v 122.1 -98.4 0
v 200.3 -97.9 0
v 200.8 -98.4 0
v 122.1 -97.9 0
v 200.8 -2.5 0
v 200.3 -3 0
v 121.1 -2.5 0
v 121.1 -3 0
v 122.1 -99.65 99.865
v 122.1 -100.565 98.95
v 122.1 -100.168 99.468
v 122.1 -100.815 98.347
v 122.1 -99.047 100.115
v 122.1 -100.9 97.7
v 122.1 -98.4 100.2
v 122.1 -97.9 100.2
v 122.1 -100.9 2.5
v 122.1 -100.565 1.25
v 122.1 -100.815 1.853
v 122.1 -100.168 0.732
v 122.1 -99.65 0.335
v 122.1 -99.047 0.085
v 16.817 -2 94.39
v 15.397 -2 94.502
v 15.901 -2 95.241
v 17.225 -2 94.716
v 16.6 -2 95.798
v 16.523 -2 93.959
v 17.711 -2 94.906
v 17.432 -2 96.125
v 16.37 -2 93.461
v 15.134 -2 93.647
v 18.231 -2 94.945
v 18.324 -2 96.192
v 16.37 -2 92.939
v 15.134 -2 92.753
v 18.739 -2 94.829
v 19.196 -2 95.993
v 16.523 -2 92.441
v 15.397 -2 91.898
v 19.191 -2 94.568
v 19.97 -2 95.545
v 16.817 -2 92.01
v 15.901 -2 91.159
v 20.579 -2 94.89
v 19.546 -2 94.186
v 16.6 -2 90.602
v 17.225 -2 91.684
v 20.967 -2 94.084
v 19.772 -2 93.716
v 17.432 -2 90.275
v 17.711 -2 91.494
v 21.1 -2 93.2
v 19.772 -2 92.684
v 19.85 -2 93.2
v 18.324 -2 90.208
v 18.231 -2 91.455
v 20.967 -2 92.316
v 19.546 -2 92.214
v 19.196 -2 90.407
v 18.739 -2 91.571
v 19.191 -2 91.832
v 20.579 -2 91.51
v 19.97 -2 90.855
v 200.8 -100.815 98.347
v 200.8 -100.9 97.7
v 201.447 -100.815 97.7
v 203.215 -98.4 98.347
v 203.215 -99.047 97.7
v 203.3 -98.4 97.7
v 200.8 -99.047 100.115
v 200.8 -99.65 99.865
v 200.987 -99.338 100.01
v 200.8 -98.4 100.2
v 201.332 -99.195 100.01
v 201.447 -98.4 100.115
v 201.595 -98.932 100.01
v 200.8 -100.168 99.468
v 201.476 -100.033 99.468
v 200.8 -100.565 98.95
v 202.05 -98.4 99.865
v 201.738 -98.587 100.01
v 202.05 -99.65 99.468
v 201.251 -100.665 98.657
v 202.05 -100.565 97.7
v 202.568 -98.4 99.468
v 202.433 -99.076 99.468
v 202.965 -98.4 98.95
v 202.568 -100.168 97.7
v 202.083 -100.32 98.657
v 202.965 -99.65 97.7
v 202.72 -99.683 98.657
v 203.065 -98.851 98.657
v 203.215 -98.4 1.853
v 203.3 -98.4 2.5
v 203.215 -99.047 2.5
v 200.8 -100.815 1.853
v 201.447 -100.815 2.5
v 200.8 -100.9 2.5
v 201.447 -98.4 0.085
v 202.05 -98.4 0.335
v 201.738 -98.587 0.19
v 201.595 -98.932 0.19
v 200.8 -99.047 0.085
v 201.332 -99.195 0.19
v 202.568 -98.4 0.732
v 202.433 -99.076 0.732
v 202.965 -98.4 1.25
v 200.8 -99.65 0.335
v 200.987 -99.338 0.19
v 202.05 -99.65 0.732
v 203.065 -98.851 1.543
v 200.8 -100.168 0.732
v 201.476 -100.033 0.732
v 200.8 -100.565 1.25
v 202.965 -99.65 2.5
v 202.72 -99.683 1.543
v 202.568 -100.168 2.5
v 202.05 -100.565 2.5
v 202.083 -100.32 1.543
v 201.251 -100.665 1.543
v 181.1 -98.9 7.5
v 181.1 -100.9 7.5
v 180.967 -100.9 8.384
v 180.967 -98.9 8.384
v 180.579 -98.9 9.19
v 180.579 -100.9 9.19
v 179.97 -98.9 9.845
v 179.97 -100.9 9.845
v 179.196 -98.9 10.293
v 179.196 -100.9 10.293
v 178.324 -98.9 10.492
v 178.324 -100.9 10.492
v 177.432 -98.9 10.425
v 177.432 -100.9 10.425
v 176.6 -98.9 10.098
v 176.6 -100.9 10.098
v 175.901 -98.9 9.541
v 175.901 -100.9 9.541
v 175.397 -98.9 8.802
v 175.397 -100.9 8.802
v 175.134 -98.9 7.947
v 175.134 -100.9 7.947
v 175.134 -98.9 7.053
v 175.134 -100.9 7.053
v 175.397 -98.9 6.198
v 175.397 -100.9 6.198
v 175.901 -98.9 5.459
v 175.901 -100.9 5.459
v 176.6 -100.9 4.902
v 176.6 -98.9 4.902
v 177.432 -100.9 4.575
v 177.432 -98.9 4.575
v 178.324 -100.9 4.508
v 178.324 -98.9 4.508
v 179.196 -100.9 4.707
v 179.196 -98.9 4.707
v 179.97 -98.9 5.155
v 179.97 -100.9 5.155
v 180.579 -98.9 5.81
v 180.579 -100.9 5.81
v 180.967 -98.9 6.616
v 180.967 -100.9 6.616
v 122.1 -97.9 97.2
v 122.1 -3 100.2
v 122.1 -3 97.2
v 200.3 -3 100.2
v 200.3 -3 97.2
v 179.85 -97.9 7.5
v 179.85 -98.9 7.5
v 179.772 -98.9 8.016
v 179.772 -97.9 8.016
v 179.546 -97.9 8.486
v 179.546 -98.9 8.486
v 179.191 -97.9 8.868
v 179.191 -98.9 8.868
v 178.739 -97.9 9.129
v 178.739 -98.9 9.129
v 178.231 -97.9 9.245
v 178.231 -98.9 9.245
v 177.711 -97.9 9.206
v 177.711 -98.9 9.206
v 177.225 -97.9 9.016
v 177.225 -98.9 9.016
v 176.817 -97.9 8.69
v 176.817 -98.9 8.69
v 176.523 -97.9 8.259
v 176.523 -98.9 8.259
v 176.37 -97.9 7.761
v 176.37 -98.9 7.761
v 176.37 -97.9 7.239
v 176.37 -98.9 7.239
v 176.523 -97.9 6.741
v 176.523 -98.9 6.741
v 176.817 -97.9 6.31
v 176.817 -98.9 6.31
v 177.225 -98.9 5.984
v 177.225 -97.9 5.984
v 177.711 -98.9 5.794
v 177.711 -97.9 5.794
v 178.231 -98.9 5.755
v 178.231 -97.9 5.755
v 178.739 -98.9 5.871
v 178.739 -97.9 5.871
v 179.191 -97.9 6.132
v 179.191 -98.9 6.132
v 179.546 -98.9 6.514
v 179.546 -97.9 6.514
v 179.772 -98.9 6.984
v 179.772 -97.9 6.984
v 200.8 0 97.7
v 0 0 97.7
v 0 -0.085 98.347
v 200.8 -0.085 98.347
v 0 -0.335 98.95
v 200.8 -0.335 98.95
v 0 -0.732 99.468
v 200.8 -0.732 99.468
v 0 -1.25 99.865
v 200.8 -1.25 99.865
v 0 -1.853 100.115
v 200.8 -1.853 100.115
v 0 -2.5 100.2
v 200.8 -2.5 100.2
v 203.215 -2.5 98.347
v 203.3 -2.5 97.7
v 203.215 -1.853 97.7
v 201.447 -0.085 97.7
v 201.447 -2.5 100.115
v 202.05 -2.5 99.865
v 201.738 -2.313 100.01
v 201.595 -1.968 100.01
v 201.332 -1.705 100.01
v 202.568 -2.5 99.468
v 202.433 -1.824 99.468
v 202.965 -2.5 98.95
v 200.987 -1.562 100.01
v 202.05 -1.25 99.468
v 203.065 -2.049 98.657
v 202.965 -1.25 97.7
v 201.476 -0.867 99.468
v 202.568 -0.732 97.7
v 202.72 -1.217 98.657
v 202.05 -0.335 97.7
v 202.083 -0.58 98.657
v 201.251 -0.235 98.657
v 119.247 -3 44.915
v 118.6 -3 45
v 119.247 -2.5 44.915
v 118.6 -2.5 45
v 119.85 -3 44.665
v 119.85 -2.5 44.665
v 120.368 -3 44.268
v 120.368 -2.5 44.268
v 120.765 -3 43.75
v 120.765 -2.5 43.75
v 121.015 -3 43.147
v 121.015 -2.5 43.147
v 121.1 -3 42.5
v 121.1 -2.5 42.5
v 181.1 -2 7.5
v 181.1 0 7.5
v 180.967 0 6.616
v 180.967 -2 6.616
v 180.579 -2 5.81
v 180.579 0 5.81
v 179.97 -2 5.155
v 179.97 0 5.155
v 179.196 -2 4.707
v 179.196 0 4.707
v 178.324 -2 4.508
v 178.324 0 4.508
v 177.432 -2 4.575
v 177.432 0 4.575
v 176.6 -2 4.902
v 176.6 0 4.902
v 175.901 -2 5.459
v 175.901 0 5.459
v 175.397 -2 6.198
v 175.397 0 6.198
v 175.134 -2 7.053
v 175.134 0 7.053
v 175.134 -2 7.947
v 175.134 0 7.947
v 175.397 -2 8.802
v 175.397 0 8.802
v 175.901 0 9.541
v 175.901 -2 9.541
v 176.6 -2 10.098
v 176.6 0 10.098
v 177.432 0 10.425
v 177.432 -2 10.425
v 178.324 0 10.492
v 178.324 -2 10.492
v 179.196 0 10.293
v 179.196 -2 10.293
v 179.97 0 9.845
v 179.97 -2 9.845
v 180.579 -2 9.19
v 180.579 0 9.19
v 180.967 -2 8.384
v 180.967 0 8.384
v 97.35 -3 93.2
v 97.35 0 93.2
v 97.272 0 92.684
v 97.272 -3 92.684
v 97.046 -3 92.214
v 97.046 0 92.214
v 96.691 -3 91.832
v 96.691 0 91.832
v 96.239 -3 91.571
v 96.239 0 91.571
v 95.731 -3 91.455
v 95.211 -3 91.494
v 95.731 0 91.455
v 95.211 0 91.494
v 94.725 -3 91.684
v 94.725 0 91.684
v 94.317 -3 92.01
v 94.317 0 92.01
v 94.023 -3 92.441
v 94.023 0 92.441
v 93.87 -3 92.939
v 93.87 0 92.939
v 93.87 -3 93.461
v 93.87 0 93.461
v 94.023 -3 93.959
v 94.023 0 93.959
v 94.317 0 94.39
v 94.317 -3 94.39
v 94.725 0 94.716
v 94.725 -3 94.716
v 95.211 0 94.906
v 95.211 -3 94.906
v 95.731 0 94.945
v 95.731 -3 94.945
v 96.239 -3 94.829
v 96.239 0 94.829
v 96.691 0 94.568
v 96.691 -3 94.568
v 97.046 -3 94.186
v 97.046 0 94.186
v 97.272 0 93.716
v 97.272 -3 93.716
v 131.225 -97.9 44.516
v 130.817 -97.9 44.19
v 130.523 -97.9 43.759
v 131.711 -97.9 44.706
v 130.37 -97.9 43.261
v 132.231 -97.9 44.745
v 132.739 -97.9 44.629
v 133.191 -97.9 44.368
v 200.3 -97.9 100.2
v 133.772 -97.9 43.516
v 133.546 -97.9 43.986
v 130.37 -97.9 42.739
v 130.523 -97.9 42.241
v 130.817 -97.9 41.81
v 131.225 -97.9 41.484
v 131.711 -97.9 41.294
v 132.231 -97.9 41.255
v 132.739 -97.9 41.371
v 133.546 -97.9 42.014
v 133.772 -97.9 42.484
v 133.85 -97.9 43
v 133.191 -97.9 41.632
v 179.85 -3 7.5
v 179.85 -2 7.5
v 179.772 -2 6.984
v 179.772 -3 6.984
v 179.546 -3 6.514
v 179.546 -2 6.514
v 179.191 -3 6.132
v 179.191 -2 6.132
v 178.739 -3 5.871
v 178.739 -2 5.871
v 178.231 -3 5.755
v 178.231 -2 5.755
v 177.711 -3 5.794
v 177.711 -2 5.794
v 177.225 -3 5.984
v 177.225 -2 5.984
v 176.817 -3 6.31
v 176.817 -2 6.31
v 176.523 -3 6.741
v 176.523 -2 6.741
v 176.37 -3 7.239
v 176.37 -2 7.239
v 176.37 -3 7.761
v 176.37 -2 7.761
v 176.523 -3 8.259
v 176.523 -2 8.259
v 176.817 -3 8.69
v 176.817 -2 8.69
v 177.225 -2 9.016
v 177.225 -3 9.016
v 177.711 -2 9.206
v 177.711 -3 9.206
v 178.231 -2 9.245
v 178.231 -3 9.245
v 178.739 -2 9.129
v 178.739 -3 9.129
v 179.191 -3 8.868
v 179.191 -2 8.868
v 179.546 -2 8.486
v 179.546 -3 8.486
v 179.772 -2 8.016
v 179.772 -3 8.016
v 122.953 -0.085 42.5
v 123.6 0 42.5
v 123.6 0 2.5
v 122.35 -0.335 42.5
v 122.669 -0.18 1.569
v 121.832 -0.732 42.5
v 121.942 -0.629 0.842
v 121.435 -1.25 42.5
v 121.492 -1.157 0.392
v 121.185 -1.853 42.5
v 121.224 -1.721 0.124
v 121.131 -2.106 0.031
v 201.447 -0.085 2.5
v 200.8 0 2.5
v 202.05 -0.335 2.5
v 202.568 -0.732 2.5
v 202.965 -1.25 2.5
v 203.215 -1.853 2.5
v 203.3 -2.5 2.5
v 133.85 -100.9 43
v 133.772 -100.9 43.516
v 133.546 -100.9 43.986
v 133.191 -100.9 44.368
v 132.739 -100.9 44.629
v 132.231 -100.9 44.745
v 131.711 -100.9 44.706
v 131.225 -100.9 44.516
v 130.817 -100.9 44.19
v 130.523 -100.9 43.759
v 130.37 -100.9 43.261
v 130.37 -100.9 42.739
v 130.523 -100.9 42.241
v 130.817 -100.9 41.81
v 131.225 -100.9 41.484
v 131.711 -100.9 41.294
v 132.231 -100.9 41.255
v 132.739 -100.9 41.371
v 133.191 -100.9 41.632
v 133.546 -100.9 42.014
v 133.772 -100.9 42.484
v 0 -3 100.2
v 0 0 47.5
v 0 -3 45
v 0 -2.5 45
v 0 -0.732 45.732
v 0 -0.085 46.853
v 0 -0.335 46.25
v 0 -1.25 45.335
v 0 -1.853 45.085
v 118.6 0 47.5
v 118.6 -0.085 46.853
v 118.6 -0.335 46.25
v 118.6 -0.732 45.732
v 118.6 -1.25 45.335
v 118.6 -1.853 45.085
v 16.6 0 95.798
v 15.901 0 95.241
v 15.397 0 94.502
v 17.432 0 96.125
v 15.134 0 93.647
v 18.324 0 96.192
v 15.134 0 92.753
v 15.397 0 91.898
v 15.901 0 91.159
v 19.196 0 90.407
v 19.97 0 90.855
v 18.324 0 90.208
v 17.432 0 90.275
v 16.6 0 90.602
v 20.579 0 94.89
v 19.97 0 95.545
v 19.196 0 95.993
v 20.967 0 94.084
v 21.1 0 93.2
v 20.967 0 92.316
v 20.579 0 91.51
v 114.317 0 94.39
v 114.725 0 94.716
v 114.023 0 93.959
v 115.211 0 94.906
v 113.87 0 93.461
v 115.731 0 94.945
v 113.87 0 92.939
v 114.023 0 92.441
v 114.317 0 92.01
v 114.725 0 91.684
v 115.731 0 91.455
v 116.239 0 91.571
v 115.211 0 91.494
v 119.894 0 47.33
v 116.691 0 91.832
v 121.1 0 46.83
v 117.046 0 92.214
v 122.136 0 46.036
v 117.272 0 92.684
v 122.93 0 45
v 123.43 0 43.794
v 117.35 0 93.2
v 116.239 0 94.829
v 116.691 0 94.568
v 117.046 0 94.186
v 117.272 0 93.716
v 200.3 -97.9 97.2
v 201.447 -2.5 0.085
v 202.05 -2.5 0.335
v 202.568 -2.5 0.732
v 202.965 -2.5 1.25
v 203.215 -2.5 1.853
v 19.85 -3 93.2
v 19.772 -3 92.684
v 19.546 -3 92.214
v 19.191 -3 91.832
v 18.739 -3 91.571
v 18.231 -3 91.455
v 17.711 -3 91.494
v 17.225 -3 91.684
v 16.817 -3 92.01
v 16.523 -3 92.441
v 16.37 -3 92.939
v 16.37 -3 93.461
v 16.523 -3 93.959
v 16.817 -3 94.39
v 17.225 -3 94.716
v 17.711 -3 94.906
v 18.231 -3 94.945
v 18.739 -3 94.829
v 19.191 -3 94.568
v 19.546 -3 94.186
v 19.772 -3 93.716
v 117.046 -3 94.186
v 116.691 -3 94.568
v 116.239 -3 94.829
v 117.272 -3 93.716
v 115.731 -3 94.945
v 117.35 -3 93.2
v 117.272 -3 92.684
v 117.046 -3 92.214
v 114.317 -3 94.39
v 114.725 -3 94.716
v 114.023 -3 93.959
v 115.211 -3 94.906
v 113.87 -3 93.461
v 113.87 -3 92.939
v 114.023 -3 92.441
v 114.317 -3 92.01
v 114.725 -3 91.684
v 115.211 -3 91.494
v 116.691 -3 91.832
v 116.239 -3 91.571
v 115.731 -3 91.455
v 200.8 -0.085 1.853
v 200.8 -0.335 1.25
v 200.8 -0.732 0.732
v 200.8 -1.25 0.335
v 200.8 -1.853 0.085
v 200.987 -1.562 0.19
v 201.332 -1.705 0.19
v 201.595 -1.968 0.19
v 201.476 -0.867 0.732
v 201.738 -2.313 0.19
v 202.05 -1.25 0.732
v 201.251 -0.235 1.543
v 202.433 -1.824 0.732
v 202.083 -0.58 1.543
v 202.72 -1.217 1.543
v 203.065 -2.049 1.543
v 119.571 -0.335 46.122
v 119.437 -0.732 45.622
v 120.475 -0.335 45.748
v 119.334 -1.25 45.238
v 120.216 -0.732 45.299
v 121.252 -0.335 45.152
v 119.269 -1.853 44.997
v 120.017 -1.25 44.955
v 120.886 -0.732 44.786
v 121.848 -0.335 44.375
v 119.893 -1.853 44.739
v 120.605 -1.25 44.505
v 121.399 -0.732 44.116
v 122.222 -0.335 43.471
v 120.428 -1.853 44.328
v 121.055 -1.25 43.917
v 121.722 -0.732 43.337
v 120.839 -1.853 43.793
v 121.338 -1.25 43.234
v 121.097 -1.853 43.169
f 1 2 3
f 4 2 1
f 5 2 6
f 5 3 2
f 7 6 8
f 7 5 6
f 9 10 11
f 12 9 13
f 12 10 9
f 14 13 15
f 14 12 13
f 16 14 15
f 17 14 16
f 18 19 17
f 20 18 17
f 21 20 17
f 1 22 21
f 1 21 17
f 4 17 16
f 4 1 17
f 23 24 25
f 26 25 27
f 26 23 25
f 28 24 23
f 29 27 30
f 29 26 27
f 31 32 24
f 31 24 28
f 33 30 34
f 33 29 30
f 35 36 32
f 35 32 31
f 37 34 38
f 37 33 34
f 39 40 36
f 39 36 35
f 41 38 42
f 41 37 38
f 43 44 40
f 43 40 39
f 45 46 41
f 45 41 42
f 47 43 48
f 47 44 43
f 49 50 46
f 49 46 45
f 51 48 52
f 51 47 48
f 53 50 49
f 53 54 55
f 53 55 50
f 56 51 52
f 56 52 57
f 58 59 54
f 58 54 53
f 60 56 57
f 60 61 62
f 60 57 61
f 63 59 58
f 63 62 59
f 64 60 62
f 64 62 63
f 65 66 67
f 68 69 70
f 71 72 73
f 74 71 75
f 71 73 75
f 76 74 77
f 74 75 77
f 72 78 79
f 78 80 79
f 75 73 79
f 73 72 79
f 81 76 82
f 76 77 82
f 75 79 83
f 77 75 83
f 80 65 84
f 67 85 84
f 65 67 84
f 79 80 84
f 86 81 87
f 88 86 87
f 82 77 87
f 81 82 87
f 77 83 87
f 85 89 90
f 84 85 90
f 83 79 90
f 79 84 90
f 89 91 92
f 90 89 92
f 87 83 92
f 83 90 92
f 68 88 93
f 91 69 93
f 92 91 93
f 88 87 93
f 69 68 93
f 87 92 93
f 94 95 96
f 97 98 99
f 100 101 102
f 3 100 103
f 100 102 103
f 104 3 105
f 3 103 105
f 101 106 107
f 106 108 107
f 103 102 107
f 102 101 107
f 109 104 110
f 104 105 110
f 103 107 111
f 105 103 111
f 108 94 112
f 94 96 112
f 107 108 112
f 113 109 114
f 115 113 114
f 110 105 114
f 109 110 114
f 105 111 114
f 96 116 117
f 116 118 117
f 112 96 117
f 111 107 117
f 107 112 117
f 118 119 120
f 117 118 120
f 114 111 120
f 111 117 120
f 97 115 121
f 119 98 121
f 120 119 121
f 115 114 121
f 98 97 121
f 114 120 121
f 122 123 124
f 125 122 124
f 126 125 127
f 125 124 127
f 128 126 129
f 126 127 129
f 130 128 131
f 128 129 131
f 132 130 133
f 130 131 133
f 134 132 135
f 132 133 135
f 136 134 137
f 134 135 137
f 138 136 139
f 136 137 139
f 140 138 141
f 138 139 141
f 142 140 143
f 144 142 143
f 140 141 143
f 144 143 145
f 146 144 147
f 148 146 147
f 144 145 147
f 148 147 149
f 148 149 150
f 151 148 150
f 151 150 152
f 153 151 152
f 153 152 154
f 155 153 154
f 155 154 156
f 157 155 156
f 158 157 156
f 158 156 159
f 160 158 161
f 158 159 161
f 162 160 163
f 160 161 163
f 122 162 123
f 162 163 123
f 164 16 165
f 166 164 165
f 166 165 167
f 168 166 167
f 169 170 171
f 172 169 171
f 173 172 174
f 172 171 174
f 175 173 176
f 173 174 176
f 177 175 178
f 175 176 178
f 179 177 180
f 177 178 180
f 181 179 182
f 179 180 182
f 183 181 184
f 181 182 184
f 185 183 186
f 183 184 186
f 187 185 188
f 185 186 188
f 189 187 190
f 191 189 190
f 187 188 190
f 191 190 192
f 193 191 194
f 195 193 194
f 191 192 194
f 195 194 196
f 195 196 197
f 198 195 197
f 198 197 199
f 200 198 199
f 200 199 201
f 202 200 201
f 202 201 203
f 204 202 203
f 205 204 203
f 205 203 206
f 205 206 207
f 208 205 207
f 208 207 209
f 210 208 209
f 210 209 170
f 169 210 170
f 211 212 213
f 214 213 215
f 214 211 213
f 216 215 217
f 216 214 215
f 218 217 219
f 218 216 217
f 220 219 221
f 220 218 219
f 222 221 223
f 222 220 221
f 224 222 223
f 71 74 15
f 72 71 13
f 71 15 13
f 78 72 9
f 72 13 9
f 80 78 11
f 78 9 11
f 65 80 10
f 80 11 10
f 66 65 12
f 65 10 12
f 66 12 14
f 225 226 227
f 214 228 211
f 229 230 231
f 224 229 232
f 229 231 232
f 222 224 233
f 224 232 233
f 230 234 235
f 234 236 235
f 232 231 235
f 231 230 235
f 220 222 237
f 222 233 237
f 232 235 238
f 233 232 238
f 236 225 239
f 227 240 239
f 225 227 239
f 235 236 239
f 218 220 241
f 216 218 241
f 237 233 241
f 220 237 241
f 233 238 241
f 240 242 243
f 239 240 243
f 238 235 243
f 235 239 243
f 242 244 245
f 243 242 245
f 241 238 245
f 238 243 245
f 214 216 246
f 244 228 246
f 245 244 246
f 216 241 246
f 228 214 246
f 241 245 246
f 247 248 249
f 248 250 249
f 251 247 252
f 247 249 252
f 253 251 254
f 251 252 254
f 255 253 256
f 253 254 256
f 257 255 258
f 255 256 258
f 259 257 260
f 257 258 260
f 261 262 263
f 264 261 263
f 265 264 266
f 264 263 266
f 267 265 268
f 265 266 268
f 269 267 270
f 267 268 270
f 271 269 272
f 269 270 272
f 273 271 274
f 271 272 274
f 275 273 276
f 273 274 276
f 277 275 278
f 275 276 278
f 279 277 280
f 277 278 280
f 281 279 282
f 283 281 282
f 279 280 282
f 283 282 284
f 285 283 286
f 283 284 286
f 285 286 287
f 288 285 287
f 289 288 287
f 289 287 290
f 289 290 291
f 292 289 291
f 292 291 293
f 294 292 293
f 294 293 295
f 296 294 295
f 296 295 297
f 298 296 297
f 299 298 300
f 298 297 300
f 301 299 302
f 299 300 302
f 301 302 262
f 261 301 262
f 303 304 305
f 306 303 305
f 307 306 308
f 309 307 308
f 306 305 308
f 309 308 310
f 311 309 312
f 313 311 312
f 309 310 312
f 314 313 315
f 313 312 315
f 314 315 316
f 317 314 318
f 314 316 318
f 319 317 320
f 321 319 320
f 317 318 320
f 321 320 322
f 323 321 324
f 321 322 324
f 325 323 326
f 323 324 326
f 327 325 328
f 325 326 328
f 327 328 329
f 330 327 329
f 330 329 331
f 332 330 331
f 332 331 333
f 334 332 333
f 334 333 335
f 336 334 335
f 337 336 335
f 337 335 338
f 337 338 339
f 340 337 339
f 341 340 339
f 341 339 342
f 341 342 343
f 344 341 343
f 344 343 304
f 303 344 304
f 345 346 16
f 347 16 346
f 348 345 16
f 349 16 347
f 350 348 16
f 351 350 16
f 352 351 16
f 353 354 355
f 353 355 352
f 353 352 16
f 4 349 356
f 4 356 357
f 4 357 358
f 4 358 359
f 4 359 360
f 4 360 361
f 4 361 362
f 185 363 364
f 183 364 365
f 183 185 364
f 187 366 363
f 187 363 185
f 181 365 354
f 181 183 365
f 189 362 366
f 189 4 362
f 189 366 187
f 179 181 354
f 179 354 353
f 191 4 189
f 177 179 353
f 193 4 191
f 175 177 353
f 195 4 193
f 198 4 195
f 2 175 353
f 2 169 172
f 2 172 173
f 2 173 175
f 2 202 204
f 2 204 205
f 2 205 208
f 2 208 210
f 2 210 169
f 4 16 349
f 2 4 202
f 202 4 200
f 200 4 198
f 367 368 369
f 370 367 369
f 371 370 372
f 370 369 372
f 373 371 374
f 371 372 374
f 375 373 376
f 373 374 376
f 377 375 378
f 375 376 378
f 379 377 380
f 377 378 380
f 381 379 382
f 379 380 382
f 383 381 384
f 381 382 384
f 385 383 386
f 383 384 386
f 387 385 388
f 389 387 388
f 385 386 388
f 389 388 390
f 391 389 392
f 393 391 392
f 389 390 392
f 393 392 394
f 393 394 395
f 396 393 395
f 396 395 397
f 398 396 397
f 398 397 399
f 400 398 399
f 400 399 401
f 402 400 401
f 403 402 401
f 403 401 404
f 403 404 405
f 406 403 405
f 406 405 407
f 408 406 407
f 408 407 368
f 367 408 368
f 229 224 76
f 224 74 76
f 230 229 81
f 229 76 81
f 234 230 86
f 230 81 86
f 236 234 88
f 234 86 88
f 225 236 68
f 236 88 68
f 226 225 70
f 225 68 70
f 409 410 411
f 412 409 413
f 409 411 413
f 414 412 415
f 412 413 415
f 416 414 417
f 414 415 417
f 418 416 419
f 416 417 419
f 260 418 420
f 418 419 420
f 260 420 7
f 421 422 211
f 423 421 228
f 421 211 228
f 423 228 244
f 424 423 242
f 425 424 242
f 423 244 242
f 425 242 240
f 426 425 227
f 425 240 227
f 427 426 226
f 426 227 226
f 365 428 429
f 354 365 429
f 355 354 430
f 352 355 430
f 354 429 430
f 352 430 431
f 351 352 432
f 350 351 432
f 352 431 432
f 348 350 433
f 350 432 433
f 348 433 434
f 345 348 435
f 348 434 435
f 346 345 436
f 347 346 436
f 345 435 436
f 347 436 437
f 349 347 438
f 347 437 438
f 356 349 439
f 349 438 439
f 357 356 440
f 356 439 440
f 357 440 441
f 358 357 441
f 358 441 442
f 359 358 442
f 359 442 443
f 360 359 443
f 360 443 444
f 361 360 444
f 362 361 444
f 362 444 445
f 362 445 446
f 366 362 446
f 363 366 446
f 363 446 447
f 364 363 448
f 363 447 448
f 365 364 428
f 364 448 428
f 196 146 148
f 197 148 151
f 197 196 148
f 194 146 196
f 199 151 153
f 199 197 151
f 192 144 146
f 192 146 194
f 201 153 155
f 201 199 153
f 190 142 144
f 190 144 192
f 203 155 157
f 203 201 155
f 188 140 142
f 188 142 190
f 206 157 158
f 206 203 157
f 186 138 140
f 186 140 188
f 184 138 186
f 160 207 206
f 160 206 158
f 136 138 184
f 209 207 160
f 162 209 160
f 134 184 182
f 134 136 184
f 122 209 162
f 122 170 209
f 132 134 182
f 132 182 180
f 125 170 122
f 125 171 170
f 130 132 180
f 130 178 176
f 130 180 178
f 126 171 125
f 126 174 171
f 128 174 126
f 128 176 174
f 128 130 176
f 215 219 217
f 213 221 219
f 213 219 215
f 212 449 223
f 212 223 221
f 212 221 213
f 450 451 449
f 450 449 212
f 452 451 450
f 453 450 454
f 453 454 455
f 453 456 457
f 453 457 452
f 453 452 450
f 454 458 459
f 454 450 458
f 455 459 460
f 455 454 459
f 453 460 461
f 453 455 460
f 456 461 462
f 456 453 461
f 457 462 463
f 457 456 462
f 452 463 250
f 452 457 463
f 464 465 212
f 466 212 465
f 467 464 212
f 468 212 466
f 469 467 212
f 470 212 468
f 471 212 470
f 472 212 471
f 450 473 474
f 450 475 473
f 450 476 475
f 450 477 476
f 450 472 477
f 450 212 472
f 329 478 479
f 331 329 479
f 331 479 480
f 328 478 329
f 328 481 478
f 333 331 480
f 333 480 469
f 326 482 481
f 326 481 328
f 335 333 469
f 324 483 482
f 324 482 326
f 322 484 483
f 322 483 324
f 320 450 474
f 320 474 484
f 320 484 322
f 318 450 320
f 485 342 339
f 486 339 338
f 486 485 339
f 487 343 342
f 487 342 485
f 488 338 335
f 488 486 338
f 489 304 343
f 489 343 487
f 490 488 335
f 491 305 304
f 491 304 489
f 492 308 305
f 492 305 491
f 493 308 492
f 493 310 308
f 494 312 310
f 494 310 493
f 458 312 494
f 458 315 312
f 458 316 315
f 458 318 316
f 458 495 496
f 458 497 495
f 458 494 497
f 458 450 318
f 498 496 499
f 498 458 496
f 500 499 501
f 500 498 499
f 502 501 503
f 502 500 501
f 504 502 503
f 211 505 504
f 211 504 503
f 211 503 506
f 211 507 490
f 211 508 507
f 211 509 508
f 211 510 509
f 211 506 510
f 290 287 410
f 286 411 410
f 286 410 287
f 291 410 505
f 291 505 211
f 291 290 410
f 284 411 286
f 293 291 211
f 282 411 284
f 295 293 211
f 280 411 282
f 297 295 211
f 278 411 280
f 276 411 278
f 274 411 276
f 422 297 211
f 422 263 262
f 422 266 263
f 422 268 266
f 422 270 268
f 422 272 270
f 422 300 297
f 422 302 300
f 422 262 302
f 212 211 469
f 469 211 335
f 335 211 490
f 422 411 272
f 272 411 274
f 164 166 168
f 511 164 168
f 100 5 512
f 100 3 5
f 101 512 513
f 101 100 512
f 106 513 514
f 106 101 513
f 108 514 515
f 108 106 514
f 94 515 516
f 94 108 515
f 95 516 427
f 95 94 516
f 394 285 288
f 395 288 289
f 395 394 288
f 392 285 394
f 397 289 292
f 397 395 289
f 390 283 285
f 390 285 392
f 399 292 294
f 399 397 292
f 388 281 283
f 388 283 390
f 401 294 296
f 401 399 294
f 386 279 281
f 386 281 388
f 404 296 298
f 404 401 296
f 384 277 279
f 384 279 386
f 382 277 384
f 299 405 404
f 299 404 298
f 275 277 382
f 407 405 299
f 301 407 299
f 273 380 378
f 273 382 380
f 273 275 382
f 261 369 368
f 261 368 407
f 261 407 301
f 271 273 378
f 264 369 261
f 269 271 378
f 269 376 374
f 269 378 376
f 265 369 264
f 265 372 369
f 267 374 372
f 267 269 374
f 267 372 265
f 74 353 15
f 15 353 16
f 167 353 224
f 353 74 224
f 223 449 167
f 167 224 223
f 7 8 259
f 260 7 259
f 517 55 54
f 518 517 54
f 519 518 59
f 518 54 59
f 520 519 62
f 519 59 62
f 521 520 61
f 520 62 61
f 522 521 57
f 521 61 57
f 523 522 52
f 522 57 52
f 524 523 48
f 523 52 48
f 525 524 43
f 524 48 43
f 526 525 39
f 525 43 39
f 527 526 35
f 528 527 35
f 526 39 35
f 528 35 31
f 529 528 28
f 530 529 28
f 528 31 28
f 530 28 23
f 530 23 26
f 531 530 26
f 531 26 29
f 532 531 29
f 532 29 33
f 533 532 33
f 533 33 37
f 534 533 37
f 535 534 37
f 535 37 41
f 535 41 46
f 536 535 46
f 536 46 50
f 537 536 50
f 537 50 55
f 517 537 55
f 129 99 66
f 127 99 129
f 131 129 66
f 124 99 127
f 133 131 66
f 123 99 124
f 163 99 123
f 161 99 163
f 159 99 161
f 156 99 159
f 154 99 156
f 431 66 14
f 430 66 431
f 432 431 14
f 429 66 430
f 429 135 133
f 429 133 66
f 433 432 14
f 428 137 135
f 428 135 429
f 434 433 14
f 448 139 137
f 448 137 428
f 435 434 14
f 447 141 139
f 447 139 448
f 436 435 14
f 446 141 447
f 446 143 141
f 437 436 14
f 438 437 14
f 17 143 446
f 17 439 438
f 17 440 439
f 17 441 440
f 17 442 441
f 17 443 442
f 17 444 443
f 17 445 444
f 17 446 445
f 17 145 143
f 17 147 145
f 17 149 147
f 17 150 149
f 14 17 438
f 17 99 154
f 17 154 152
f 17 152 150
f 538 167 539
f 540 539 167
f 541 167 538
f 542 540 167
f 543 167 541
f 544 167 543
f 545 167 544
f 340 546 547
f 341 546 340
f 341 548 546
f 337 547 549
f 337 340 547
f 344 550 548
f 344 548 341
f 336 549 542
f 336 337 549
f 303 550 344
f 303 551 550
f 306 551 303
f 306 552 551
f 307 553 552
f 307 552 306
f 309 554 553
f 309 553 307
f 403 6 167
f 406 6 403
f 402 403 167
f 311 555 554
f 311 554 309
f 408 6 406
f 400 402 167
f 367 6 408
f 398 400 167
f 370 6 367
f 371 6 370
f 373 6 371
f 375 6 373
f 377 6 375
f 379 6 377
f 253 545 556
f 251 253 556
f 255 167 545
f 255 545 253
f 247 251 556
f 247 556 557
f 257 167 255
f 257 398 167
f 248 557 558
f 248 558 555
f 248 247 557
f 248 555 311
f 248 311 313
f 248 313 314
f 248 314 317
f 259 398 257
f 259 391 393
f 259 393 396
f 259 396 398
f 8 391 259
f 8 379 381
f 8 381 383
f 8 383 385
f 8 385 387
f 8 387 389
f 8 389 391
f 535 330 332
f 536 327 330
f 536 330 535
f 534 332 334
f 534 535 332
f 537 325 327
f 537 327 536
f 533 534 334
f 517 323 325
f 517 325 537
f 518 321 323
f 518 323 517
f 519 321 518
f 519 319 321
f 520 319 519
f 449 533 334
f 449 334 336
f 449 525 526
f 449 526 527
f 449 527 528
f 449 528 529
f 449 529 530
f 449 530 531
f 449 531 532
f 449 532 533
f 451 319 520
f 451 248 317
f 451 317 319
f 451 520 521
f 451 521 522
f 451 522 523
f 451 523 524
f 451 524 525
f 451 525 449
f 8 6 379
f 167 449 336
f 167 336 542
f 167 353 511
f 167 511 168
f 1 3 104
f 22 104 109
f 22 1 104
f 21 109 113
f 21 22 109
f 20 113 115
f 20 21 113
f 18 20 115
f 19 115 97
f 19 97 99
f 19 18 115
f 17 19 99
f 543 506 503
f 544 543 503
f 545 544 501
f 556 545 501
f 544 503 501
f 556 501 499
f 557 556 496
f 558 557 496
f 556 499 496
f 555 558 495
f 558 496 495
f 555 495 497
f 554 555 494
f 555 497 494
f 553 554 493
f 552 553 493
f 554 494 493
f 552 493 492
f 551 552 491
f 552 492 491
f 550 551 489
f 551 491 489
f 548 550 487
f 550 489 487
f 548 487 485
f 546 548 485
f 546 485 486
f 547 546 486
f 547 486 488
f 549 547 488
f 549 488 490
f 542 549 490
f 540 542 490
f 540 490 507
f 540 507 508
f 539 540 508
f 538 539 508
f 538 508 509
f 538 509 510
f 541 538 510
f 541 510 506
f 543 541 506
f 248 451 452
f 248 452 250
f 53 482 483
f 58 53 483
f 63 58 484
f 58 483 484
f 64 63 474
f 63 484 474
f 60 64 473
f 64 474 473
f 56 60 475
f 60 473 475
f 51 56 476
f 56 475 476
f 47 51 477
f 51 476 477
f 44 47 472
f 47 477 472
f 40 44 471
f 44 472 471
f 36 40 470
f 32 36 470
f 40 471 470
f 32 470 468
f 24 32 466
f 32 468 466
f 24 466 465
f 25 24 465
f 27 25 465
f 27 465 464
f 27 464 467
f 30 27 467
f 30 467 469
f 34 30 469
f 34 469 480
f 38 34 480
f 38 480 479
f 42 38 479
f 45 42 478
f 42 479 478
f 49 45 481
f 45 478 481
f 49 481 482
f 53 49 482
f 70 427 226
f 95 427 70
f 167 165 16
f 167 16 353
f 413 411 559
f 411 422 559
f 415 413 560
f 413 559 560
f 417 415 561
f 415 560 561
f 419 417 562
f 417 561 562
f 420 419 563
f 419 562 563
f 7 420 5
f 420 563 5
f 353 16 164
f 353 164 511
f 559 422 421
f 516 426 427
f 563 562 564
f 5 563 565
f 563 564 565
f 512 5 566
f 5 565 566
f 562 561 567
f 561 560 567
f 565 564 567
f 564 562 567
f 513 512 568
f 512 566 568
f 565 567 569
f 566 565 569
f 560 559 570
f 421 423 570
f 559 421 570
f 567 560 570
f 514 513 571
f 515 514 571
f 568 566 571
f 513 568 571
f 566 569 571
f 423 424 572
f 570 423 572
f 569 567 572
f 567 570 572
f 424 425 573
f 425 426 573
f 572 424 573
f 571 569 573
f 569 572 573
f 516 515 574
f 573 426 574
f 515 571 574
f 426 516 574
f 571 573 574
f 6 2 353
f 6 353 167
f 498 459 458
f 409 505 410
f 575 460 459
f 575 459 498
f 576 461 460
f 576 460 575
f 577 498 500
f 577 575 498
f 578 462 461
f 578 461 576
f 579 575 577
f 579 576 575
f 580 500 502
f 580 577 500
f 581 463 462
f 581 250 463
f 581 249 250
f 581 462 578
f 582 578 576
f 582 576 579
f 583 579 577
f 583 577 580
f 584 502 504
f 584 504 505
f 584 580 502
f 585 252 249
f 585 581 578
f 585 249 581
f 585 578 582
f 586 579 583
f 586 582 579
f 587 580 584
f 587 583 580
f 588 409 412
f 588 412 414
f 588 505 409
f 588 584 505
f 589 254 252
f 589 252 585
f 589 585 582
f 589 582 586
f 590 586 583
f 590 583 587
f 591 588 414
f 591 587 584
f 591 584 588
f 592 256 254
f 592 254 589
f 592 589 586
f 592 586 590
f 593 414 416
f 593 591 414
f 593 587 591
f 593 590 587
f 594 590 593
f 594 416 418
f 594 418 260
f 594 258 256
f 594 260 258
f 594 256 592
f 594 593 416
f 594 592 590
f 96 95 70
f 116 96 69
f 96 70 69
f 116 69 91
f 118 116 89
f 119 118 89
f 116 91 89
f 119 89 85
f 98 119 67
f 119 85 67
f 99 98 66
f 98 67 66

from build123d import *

# Parameters (mm, degrees)
MAIN_BODY_DEPTH              = 100.2
SKETCH4_R                    = 1.75
BACK_SCREW_HOLES_DEPTH       = 3
SKETCH5_R                    = 3
BACK_SCREW_HEADS_DEPTH       = 2
SKETCH7_W                    = 213.220218809
SKETCH7_H                    = 45
PAPER_THROUGH_HOLE_DEPTH     = 10
SKETCH8_W                    = 78.2
SKETCH8_H                    = 94.9
TOP_DEPTH                    = 3
SKETCH9_R                    = 1.75
FRONT_RIGHT_SCREW_HOLE_DEPTH = 3
SKETCH11_R                   = 3
FRONT_RIGHT_SCREW_HEAD_DEPTH = 2
SKETCH19_R                   = 1.75
LATCH_SCREW_HOLE_DEPTH       = 3
SKETCH20_R                   = 1.75
CUT_EXTRUDE1_DEPTH           = 10
FILLET2_R                    = 2.5


with BuildPart() as part:
    # Sketch1 → Main_Body (new body)
    with BuildSketch(Plane.XY):
        Polygon((0, 0), (203.3, 0), (203.3, -100.9), (122.1, -100.9), (122.1, -97.9), (200.3, -97.9), (200.3, -3), (0, -3), align=None)
    extrude(amount=MAIN_BODY_DEPTH)

    # Sketch4 → Back_Screw_Holes (cut)
    with BuildSketch(Plane(origin=(0, 0, 0), x_dir=(1, 0, 0), z_dir=(0, 1, 0))):
        with Locations((178.1, -7.5)):
            Circle(SKETCH4_R)
        with Locations((18.1, -7.5)):
            Circle(SKETCH4_R)
        with Locations((18.1, -93.2)):
            Circle(SKETCH4_R)
    extrude(amount=-BACK_SCREW_HOLES_DEPTH, mode=Mode.SUBTRACT)

    # Sketch5 → Back_Screw_Heads (cut)
    with BuildSketch(Plane(origin=(0, 0, 0), x_dir=(1, 0, 0), z_dir=(0, 1, 0))):
        with Locations((18.1, -7.5)):
            Circle(SKETCH5_R)
        with Locations((178.1, -7.5)):
            Circle(SKETCH5_R)
        with Locations((18.1, -93.2)):
            Circle(SKETCH5_R)
    extrude(amount=-BACK_SCREW_HEADS_DEPTH, mode=Mode.SUBTRACT)

    # Sketch7 → Paper_Through_Hole (cut)
    with BuildSketch(Plane.XZ.offset(3)):
        with Locations((14.489890596, 22.5)):
            Rectangle(SKETCH7_W, SKETCH7_H)
    extrude(amount=-PAPER_THROUGH_HOLE_DEPTH, mode=Mode.SUBTRACT)

    # Sketch9 → Front_Right_Screw_Hole (cut)
    with BuildSketch(Plane.XZ.offset(100.9)):
        with Locations((178.1, 7.5)):
            Circle(SKETCH9_R)
    extrude(amount=-FRONT_RIGHT_SCREW_HOLE_DEPTH, mode=Mode.SUBTRACT)

    # Sketch11 → Front_Right_Screw_Head (cut)
    with BuildSketch(Plane.XZ.offset(100.9)):
        with Locations((178.1, 7.5)):
            Circle(SKETCH11_R)
    extrude(amount=-FRONT_RIGHT_SCREW_HEAD_DEPTH, mode=Mode.SUBTRACT)

    # Sketch19 → Latch_Screw_Hole (cut)
    with BuildSketch(Plane.XZ.offset(100.9)):
        with Locations((132.1, 43)):
            Circle(SKETCH19_R)
    extrude(amount=-LATCH_SCREW_HOLE_DEPTH, mode=Mode.SUBTRACT)

    # Sketch20 → Cut-Extrude1 (cut)
    with BuildSketch(Plane(origin=(0, 0, 0), x_dir=(1, 0, 0), z_dir=(0, 1, 0))):
        with Locations((95.6, -93.2)):
            Circle(SKETCH20_R)
        with Locations((115.6, -93.2)):
            Circle(SKETCH20_R)
    extrude(amount=-CUT_EXTRUDE1_DEPTH, mode=Mode.SUBTRACT)

    # Fillet2
    fillet2_edges = [part.edges().sort_by_distance(p)[0] for p in [
        (203.3, 0, 50.1),
        (203.3, -100.9, 50.1),
        (162.7, -100.9, 100.2),
        (203.3, -50.45, 100.2),
        (101.65, 0, 100.2),
        (60.55, 0, 45),
        (121.1, 0, 22.5),
        (121.1, -1.5, 45),
        (162.2, 0, 0),
        (203.3, -50.45, 0),
        (162.7, -100.9, 0),
    ]]
    fillet(fillet2_edges, radius=FILLET2_R)


with BuildPart() as body_2:
    # Sketch8 → Top (new body)
    with BuildSketch(Plane.XY.offset(100.2)):
        with Locations((161.2, -50.45)):
            Rectangle(SKETCH8_W, SKETCH8_H)
    extrude(amount=-TOP_DEPTH)


solid = Compound([part.part, body_2.part])
